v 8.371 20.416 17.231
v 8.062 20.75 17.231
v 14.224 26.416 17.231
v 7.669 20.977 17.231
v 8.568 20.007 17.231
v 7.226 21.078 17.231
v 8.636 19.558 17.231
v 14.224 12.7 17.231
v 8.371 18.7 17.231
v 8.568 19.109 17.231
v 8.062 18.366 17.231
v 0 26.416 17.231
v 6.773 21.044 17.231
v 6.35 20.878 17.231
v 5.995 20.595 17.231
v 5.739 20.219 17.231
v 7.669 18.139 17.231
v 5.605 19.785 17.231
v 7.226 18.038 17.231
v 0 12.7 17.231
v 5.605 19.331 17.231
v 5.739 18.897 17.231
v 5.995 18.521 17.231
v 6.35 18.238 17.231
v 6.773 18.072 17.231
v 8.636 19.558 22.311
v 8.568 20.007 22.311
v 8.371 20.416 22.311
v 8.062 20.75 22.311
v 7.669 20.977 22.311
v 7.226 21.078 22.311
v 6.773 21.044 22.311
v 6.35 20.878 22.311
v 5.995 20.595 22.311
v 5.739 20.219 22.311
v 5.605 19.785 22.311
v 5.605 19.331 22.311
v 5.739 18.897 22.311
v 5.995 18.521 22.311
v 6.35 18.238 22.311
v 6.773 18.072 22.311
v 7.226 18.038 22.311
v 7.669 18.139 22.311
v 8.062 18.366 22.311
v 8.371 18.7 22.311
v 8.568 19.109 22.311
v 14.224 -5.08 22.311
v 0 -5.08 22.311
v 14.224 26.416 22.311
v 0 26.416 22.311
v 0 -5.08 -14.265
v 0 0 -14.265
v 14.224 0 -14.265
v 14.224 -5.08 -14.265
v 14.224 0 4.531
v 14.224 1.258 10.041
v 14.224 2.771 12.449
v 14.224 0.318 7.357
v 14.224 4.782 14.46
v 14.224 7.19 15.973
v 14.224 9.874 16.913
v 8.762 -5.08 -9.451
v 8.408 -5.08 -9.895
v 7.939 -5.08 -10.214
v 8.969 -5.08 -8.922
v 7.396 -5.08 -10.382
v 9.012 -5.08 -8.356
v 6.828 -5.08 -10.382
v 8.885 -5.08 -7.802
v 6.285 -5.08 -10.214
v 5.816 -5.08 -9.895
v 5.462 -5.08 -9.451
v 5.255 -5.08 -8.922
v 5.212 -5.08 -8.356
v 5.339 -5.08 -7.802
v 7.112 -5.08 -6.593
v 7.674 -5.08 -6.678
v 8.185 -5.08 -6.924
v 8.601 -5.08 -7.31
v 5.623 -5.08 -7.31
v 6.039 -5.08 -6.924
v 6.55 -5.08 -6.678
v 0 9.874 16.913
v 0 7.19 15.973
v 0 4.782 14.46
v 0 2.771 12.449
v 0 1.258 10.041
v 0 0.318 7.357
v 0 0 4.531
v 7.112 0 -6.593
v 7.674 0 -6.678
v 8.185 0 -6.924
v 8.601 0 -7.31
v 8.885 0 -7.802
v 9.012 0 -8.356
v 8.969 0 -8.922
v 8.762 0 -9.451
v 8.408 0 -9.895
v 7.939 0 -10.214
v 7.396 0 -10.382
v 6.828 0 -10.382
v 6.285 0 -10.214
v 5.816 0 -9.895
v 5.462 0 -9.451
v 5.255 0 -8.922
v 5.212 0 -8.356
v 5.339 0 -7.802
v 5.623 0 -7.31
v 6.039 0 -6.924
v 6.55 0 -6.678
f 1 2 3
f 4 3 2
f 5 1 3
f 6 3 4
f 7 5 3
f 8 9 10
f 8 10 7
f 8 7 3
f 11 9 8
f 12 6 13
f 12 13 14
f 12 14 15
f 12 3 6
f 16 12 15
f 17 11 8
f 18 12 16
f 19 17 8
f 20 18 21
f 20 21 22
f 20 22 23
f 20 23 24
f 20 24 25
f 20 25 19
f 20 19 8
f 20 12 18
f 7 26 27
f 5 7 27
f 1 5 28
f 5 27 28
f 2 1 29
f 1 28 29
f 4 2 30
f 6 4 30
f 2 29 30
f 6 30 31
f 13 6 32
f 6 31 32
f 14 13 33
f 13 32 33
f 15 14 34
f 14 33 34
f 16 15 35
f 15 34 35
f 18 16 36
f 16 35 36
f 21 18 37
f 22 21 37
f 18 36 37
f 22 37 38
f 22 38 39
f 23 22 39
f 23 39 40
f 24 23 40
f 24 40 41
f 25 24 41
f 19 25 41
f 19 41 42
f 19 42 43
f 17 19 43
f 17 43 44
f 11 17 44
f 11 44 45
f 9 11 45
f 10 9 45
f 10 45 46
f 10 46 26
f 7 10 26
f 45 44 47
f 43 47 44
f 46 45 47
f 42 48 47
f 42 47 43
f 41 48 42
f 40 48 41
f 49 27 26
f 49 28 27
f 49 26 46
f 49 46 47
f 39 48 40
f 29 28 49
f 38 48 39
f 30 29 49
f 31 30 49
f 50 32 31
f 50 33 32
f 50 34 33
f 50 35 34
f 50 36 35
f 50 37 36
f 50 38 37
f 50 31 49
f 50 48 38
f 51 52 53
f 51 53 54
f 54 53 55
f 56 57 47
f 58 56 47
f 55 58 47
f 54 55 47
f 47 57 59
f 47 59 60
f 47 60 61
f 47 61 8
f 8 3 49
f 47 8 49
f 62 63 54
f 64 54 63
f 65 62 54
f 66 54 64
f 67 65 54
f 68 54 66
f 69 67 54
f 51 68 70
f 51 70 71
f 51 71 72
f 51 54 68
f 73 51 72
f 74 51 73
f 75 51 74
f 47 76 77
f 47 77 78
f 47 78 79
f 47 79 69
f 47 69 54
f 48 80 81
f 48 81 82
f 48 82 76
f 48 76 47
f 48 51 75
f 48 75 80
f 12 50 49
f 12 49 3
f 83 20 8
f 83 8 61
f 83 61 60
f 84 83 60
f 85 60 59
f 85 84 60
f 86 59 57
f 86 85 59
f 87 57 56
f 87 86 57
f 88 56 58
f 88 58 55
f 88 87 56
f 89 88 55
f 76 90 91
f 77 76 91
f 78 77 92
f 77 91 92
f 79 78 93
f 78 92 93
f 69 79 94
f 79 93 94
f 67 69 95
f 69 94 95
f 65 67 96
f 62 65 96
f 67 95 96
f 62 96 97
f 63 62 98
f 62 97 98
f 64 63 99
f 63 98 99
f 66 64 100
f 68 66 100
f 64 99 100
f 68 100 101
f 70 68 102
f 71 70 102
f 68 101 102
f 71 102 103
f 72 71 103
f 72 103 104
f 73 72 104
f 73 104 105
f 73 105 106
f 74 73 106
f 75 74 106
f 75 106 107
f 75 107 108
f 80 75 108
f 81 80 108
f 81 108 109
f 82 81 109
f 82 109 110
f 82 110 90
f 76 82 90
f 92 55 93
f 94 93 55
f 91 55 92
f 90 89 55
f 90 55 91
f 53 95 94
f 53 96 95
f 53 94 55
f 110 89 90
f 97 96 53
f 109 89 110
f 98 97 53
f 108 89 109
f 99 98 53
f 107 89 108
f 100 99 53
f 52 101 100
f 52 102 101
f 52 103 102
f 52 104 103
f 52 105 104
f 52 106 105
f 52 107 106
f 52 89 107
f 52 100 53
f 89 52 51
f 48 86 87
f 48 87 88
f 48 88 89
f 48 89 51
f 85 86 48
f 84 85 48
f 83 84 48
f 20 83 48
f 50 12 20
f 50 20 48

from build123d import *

# Parameters (mm, degrees)
BOSS_EXTRUDE1_DEPTH = 14.224
SKETCH2_R           = 1.524
CUT_EXTRUDE1_DEPTH  = 48.306775498
SKETCH3_R           = 1.905
CUT_EXTRUDE2_DEPTH  = 38.388604586


with BuildPart() as part:
    # Sketch1 → Boss-Extrude1 (new body)
    with BuildSketch(Plane(origin=(0, 0, 0), x_dir=(0, 0, -1), z_dir=(1, 0, 0))):
        with BuildLine():
            Line((-17.230995516, 26.416), (-17.230995516, 12.7))
            ThreePointArc((-17.230995516, 12.7), (-13.511251637, 3.719743879), (-4.530995516, 0))
            Line((-4.530995516, 0), (14.265004484, 0))
            Line((14.265004484, 0), (14.265004484, -5.08))
            Line((14.265004484, -5.08), (-17.230995516, -5.08))
            Line((-17.230995516, -5.08), (-22.310995516, -5.08))
            Line((-22.310995516, -5.08), (-22.310995516, 26.416))
            Line((-22.310995516, 26.416), (-17.230995516, 26.416))
        make_face()
    extrude(amount=BOSS_EXTRUDE1_DEPTH)

    # Sketch2 → Cut-Extrude1 (cut, through all)
    with BuildSketch(Plane.XY.offset(22.310995516)):
        with Locations((7.112, 19.558)):
            Circle(SKETCH2_R)
    extrude(amount=-CUT_EXTRUDE1_DEPTH, mode=Mode.SUBTRACT)

    # Sketch3 → Cut-Extrude2 (cut, through all)
    with BuildSketch(Plane(origin=(0, 0, 0), x_dir=(1, 0, 0), z_dir=(0, 1, 0))):
        with Locations(Location((7.112, 8.49810052, 0), (0, 0, 270))):
            Circle(SKETCH3_R)
    extrude(amount=-CUT_EXTRUDE2_DEPTH, mode=Mode.SUBTRACT)


solid = part.part
